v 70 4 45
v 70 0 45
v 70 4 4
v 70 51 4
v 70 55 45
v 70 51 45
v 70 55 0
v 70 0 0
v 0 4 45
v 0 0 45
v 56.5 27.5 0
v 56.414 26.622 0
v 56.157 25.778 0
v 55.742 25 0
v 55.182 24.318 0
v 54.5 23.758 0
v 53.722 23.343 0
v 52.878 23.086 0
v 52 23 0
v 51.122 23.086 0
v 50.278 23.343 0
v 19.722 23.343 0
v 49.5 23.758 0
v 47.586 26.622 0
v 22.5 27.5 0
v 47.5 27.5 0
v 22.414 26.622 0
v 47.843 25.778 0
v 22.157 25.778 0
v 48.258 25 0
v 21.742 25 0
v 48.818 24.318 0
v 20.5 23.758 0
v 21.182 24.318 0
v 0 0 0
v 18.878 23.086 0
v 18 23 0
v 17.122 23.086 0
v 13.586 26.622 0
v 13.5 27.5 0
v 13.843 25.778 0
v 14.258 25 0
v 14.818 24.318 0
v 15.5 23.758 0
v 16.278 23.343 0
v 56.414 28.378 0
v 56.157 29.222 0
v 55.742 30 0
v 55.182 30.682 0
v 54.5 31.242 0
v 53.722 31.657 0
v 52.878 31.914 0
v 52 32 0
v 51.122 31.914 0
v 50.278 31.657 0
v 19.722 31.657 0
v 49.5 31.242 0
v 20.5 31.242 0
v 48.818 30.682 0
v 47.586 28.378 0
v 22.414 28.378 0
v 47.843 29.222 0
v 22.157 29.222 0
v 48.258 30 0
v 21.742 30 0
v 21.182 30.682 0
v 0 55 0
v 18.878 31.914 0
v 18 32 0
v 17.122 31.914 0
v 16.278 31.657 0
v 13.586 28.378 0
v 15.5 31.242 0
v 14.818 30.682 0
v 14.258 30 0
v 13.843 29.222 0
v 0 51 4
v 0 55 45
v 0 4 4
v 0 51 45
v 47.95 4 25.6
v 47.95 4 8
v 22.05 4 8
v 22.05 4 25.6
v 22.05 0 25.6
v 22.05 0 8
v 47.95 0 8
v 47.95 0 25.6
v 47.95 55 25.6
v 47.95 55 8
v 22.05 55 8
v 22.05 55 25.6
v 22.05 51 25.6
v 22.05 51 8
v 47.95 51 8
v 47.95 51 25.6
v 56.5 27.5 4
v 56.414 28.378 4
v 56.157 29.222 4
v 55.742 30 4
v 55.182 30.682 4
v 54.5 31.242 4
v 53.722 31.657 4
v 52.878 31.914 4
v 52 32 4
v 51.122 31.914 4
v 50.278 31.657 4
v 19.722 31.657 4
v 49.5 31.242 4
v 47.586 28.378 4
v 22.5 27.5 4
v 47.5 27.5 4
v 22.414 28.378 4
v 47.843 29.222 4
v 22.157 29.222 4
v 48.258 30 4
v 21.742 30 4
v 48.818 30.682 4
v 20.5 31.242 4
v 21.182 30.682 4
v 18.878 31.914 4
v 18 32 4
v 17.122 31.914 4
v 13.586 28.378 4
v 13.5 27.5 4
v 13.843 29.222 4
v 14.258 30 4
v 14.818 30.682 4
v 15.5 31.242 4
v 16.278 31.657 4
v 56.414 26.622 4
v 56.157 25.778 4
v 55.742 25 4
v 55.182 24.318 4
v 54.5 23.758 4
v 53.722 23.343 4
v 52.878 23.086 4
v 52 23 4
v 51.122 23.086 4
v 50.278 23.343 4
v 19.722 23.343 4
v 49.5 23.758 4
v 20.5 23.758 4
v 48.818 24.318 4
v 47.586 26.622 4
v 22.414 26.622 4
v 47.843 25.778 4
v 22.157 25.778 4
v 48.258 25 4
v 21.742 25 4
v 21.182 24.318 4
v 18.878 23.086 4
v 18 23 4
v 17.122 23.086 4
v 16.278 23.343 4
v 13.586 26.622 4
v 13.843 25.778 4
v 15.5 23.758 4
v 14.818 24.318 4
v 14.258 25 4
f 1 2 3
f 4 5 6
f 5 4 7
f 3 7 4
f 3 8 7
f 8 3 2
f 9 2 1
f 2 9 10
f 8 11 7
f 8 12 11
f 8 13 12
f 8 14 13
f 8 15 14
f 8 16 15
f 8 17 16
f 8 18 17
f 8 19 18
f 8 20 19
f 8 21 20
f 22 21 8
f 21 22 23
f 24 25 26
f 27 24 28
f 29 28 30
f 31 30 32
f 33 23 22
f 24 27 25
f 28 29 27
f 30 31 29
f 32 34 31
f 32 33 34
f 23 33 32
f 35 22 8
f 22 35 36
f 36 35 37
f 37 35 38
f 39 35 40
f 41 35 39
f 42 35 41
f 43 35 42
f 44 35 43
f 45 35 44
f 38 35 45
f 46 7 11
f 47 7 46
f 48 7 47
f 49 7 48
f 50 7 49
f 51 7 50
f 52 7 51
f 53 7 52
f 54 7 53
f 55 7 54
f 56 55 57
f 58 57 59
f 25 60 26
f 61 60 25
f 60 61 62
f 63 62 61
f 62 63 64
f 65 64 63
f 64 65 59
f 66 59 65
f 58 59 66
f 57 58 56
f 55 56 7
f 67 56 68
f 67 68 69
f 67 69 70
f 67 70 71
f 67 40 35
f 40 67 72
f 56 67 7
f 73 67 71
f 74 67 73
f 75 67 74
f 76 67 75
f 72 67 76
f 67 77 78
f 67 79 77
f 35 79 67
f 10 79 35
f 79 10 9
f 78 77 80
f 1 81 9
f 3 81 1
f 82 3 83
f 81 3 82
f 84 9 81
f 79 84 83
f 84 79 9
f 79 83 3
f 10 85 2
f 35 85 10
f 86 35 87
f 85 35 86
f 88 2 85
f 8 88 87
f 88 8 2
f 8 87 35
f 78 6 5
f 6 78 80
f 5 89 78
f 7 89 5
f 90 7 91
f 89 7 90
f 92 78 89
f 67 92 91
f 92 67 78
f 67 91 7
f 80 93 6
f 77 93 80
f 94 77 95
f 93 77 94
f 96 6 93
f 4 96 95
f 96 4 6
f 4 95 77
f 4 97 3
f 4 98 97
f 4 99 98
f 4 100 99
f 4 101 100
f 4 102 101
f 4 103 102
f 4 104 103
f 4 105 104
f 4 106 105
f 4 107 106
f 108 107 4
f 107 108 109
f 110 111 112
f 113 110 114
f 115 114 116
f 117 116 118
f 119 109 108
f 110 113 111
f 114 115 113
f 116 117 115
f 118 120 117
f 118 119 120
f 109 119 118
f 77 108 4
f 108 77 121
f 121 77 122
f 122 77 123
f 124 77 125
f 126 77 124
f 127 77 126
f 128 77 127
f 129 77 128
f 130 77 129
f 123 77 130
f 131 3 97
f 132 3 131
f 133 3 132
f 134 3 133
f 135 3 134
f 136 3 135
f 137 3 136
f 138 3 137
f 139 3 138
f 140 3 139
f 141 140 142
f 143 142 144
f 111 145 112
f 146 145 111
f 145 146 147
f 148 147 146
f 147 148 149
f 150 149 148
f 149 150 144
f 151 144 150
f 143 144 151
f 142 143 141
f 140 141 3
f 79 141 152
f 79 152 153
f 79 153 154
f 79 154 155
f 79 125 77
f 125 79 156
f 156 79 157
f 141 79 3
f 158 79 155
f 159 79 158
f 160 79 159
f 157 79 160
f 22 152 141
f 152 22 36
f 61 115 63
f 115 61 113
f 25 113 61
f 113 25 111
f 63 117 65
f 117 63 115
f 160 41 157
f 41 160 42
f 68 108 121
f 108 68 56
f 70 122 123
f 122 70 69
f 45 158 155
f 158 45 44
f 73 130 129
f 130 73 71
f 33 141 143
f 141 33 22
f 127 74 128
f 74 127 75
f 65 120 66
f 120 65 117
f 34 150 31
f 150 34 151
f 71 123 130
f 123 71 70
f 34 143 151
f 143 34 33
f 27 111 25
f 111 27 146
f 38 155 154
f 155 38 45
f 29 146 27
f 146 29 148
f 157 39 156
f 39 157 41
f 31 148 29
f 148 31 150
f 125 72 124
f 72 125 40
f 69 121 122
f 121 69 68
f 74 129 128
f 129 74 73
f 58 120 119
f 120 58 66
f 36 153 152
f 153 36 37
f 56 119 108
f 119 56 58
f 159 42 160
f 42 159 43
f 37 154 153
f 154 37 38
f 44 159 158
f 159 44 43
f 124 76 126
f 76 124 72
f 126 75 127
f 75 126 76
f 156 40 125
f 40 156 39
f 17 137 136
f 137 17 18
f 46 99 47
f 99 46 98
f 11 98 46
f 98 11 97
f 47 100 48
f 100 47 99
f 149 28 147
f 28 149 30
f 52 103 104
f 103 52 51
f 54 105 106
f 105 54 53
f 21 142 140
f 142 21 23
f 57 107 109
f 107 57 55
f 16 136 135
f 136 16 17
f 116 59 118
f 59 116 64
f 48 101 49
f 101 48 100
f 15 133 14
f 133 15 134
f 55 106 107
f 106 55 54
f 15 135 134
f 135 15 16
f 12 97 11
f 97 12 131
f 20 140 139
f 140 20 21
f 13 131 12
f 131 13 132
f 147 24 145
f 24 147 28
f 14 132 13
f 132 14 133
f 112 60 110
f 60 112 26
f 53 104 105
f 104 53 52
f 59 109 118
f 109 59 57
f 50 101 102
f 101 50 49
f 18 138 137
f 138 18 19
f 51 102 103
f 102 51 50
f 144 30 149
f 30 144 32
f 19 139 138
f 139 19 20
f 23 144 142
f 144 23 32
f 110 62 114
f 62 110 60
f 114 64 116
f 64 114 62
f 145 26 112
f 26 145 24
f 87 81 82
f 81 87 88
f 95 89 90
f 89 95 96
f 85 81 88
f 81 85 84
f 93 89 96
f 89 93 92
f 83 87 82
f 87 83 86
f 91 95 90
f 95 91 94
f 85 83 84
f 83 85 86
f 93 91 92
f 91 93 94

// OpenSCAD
$fn = 32;

// ----------------------------------------------------------------------
// U-bracket: 70 x 55 x 45 mm
// ----------------------------------------------------------------------

// --- parameters (mm) ---
base_len = 70;            // outer length, X
channel_w = 55;           // outer width, Y
upright_h = 45;           // upright height, Z
mat_t = 4;                // wall thickness
hole_d = 9;               // clearance for M8
window_l = 25.9;          // window length
window_h = 17.6;          // window height

module hole_z(px, py) {
  translate([px, py, -2.5]) cylinder(h = mat_t + 5, d = hole_d);
}
module hole_y_pz(pz) {
  /* through both uprights along Y */
  translate([0, -2.5, pz]) rotate([-90, 0, 0]) cylinder(h = channel_w + 5, d = hole_d);
}

module base() {
  cube([base_len, channel_w, mat_t]);
}

module uprights() {
  cube([base_len, mat_t, upright_h]);
  translate([0, channel_w - mat_t, 0]) cube([base_len, mat_t, upright_h]);
}

difference() {
  union() {
    base();
    uprights();
  }
  hole_z(18, 27.5);
  hole_z(52, 27.5);
  /* lightening window through both uprights */
  translate([base_len / 2 - window_l / 2, -1, mat_t + 4])
    cube([window_l, channel_w + 2, window_h]);
}
